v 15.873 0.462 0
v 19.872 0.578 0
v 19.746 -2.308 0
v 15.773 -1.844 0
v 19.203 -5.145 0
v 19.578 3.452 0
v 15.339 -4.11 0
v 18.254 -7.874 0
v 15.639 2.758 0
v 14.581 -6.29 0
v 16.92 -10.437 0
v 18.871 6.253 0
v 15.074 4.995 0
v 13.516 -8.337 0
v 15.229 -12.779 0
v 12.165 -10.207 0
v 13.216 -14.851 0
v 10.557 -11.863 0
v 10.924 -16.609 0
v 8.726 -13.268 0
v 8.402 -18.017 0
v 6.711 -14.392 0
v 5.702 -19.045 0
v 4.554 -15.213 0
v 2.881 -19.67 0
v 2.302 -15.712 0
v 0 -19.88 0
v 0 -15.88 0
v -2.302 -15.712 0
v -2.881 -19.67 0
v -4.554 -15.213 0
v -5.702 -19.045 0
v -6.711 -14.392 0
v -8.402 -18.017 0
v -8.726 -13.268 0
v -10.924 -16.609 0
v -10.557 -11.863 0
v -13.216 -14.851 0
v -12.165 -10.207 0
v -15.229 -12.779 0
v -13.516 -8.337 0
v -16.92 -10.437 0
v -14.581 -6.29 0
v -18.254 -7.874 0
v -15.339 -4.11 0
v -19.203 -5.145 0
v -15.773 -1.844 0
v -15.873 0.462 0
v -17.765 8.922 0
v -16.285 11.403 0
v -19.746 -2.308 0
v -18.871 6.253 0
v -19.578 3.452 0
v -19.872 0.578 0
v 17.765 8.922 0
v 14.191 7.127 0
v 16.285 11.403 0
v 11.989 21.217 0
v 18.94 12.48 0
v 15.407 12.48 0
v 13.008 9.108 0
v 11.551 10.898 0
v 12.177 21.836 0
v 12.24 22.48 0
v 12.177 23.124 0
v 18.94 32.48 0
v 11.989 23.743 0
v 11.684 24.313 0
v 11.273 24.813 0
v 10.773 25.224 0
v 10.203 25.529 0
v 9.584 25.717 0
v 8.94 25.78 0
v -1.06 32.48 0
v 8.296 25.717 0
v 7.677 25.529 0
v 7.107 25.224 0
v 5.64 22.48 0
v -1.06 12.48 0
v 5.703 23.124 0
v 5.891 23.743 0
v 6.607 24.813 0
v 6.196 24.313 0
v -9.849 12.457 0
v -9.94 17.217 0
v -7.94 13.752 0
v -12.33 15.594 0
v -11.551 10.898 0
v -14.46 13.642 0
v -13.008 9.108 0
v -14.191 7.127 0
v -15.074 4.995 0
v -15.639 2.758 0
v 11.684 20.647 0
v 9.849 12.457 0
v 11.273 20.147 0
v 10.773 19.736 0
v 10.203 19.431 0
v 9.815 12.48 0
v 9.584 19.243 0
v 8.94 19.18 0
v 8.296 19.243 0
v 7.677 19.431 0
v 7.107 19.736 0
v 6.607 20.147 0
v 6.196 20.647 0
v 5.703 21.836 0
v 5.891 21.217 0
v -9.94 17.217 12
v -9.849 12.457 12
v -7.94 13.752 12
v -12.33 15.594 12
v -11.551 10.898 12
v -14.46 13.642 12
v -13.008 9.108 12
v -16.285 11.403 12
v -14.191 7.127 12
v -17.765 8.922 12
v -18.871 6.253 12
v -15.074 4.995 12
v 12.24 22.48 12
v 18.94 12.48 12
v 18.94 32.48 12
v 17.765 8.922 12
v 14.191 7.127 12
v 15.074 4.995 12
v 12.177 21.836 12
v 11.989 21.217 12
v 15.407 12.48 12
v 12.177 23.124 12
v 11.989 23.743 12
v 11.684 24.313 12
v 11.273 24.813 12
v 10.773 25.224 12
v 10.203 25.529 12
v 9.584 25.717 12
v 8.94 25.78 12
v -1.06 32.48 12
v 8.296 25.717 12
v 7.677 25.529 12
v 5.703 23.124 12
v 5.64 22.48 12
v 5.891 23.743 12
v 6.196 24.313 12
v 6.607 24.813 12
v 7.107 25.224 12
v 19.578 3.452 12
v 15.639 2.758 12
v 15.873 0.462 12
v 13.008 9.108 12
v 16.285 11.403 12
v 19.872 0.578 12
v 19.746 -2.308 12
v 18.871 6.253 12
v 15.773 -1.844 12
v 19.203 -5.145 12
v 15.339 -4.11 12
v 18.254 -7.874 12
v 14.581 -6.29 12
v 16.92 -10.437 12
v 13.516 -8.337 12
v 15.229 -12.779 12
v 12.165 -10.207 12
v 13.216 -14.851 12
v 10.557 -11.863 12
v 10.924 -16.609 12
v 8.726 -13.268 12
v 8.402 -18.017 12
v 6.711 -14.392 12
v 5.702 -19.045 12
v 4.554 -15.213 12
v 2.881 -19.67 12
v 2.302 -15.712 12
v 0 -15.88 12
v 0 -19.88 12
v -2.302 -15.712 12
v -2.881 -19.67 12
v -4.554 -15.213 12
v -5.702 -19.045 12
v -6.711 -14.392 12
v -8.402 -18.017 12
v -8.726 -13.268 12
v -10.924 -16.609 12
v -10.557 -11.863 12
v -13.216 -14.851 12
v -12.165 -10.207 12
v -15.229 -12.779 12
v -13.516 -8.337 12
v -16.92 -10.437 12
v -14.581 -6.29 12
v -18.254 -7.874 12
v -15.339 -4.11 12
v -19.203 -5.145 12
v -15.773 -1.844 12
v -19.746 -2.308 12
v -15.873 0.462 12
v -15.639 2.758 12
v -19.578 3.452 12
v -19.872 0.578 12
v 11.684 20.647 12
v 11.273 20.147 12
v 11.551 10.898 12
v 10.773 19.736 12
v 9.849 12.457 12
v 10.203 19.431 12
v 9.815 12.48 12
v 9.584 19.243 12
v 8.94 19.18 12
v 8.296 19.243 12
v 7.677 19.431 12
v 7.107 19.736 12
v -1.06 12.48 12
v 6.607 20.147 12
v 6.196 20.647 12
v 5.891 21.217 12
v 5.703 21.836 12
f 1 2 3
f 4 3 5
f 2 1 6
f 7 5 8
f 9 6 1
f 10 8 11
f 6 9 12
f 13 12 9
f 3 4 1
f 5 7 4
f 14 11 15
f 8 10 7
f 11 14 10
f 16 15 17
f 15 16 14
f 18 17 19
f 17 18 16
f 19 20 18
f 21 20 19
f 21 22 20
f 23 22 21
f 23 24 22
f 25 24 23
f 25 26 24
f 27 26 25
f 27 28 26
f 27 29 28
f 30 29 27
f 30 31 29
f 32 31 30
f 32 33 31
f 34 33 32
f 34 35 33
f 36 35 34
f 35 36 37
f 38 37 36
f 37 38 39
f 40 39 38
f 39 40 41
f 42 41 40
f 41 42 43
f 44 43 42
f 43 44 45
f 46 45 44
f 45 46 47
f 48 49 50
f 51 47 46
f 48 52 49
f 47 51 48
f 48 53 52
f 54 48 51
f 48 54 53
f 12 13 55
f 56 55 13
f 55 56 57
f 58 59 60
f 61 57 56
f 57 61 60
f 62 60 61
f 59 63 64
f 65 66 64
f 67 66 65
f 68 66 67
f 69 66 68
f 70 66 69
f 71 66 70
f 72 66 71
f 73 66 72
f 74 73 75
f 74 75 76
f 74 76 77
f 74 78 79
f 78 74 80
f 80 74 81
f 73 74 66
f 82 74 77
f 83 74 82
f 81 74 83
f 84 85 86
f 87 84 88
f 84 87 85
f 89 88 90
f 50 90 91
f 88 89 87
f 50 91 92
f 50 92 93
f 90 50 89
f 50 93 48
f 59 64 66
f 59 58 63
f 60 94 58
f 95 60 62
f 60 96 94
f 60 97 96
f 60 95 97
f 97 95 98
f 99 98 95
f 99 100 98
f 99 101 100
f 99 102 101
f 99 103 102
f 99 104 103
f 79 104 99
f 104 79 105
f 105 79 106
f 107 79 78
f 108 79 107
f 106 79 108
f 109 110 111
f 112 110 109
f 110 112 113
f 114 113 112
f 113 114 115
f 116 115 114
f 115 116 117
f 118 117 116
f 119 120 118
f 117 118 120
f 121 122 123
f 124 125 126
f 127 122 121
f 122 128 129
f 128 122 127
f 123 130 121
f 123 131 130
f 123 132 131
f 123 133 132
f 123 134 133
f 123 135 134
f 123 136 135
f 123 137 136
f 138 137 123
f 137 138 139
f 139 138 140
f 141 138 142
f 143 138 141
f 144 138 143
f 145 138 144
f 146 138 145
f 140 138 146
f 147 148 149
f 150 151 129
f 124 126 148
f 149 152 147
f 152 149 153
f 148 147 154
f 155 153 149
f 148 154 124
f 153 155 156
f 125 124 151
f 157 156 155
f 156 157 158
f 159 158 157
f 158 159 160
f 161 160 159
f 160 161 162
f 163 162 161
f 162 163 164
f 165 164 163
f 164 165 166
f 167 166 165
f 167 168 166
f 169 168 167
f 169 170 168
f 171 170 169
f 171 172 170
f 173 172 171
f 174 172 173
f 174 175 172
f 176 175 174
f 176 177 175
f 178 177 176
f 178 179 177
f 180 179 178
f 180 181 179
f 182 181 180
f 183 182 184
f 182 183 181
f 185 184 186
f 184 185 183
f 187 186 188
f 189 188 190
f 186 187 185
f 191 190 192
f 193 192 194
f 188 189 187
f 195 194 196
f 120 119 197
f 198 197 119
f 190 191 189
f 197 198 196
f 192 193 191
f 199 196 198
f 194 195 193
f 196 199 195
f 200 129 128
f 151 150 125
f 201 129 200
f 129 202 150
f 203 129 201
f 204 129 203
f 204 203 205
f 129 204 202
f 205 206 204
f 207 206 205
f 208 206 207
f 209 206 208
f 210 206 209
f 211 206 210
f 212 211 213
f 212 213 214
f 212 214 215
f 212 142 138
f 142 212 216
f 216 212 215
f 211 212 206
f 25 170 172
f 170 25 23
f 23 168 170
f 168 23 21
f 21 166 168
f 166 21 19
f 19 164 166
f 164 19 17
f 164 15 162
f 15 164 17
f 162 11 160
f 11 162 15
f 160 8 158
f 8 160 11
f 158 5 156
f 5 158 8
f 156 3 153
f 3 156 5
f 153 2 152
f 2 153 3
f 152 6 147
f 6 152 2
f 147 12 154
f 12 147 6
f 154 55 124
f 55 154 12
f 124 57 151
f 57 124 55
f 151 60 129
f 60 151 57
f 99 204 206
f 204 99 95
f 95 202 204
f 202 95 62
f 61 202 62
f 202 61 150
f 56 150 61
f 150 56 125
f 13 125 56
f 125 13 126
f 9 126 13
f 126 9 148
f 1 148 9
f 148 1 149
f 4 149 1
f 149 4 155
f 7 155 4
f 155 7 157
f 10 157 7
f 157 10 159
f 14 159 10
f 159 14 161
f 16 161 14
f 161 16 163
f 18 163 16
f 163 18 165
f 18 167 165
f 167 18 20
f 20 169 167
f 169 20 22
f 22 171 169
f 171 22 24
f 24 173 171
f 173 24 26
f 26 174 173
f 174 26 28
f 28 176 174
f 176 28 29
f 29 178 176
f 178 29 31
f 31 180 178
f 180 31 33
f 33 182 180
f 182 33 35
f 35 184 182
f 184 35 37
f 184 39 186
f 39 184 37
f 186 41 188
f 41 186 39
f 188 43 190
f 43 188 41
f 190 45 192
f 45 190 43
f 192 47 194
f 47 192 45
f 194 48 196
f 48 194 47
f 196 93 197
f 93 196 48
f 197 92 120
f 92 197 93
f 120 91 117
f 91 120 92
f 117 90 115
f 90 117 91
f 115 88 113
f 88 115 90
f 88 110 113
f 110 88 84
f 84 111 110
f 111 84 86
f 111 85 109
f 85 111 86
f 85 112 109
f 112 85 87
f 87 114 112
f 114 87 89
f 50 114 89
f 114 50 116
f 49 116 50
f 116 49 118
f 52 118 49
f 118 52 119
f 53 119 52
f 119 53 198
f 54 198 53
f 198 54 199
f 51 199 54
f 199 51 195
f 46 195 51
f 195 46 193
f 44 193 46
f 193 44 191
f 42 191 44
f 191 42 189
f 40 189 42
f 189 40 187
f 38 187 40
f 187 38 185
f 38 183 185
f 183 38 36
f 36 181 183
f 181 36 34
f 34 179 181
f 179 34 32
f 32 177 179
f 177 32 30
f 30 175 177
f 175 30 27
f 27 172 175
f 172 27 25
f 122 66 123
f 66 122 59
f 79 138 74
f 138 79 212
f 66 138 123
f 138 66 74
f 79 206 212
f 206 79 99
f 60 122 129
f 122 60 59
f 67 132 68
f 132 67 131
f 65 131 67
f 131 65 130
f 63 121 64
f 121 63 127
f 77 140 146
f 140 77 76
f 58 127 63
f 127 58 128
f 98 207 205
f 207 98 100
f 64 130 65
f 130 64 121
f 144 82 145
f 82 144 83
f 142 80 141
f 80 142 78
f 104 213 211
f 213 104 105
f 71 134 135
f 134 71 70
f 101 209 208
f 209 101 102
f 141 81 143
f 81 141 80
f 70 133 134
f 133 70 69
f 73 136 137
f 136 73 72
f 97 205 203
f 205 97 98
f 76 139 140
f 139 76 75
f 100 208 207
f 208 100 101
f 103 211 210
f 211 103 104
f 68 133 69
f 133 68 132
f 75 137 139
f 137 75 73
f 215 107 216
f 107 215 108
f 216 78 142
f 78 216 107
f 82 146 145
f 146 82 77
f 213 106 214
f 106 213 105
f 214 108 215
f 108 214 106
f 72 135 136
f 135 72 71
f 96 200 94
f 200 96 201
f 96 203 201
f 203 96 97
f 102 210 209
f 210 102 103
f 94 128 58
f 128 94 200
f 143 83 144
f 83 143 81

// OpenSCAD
$fn = 32;

// ----------------------------------------------------------------------
// Pipe clamp: 39.76 mm ring, 4 mm wall, 12 mm wide
// ----------------------------------------------------------------------

// --- parameters (mm) ---
outer_r = 19.88;          // clamp outside radius
inner_r = 15.88;          // pipe bore radius
band = 4;                 // band thickness
clamp_w = 12;             // clamp width
opening = 60;             // opening angle between the ends
lug_w = 20;               // lug width
lug_len = 20;             // lug length
bolt_d = 6.6;             // bolt hole

clamp_profile = [[-9.94, 17.217], [-12.33, 15.594], [-14.46, 13.642], [-16.285, 11.403], [-17.765, 8.922], [-18.871, 6.253], [-19.578, 3.452], [-19.872, 0.578], [-19.746, -2.308], [-19.203, -5.145], [-18.254, -7.874], [-16.92, -10.437], [-15.229, -12.779], [-13.216, -14.851], [-10.924, -16.609], [-8.402, -18.017], [-5.702, -19.045], [-2.881, -19.67], [0, -19.88], [2.881, -19.67], [5.702, -19.045], [8.402, -18.017], [10.924, -16.609], [13.216, -14.851], [15.229, -12.779], [16.92, -10.437], [18.254, -7.874], [19.203, -5.145], [19.746, -2.308], [19.872, 0.578], [19.578, 3.452], [18.871, 6.253], [17.765, 8.922], [16.285, 11.403], [14.46, 13.642], [12.33, 15.594], [9.94, 17.217], [7.94, 13.752], [9.849, 12.457], [11.551, 10.898], [13.008, 9.108], [14.191, 7.127], [15.074, 4.995], [15.639, 2.758], [15.873, 0.462], [15.773, -1.844], [15.339, -4.11], [14.581, -6.29], [13.516, -8.337], [12.165, -10.207], [10.557, -11.863], [8.726, -13.268], [6.711, -14.392], [4.554, -15.213], [2.302, -15.712], [0, -15.88], [-2.302, -15.712], [-4.554, -15.213], [-6.711, -14.392], [-8.726, -13.268], [-10.557, -11.863], [-12.165, -10.207], [-13.516, -8.337], [-14.581, -6.29], [-15.339, -4.11], [-15.773, -1.844], [-15.873, 0.462], [-15.639, 2.758], [-15.074, 4.995], [-14.191, 7.127], [-13.008, 9.108], [-11.551, 10.898], [-9.849, 12.457], [-7.94, 13.752]];

difference() {
  union() {
    linear_extrude(height = clamp_w) polygon(clamp_profile);
    /* bolt lug on the other end */
    translate([-1.06, 12.48, 0]) cube([lug_w, 20, clamp_w]);
  }
  translate([8.94, 22.48, -2.5]) cylinder(h = clamp_w + 5, d = bolt_d);
}
